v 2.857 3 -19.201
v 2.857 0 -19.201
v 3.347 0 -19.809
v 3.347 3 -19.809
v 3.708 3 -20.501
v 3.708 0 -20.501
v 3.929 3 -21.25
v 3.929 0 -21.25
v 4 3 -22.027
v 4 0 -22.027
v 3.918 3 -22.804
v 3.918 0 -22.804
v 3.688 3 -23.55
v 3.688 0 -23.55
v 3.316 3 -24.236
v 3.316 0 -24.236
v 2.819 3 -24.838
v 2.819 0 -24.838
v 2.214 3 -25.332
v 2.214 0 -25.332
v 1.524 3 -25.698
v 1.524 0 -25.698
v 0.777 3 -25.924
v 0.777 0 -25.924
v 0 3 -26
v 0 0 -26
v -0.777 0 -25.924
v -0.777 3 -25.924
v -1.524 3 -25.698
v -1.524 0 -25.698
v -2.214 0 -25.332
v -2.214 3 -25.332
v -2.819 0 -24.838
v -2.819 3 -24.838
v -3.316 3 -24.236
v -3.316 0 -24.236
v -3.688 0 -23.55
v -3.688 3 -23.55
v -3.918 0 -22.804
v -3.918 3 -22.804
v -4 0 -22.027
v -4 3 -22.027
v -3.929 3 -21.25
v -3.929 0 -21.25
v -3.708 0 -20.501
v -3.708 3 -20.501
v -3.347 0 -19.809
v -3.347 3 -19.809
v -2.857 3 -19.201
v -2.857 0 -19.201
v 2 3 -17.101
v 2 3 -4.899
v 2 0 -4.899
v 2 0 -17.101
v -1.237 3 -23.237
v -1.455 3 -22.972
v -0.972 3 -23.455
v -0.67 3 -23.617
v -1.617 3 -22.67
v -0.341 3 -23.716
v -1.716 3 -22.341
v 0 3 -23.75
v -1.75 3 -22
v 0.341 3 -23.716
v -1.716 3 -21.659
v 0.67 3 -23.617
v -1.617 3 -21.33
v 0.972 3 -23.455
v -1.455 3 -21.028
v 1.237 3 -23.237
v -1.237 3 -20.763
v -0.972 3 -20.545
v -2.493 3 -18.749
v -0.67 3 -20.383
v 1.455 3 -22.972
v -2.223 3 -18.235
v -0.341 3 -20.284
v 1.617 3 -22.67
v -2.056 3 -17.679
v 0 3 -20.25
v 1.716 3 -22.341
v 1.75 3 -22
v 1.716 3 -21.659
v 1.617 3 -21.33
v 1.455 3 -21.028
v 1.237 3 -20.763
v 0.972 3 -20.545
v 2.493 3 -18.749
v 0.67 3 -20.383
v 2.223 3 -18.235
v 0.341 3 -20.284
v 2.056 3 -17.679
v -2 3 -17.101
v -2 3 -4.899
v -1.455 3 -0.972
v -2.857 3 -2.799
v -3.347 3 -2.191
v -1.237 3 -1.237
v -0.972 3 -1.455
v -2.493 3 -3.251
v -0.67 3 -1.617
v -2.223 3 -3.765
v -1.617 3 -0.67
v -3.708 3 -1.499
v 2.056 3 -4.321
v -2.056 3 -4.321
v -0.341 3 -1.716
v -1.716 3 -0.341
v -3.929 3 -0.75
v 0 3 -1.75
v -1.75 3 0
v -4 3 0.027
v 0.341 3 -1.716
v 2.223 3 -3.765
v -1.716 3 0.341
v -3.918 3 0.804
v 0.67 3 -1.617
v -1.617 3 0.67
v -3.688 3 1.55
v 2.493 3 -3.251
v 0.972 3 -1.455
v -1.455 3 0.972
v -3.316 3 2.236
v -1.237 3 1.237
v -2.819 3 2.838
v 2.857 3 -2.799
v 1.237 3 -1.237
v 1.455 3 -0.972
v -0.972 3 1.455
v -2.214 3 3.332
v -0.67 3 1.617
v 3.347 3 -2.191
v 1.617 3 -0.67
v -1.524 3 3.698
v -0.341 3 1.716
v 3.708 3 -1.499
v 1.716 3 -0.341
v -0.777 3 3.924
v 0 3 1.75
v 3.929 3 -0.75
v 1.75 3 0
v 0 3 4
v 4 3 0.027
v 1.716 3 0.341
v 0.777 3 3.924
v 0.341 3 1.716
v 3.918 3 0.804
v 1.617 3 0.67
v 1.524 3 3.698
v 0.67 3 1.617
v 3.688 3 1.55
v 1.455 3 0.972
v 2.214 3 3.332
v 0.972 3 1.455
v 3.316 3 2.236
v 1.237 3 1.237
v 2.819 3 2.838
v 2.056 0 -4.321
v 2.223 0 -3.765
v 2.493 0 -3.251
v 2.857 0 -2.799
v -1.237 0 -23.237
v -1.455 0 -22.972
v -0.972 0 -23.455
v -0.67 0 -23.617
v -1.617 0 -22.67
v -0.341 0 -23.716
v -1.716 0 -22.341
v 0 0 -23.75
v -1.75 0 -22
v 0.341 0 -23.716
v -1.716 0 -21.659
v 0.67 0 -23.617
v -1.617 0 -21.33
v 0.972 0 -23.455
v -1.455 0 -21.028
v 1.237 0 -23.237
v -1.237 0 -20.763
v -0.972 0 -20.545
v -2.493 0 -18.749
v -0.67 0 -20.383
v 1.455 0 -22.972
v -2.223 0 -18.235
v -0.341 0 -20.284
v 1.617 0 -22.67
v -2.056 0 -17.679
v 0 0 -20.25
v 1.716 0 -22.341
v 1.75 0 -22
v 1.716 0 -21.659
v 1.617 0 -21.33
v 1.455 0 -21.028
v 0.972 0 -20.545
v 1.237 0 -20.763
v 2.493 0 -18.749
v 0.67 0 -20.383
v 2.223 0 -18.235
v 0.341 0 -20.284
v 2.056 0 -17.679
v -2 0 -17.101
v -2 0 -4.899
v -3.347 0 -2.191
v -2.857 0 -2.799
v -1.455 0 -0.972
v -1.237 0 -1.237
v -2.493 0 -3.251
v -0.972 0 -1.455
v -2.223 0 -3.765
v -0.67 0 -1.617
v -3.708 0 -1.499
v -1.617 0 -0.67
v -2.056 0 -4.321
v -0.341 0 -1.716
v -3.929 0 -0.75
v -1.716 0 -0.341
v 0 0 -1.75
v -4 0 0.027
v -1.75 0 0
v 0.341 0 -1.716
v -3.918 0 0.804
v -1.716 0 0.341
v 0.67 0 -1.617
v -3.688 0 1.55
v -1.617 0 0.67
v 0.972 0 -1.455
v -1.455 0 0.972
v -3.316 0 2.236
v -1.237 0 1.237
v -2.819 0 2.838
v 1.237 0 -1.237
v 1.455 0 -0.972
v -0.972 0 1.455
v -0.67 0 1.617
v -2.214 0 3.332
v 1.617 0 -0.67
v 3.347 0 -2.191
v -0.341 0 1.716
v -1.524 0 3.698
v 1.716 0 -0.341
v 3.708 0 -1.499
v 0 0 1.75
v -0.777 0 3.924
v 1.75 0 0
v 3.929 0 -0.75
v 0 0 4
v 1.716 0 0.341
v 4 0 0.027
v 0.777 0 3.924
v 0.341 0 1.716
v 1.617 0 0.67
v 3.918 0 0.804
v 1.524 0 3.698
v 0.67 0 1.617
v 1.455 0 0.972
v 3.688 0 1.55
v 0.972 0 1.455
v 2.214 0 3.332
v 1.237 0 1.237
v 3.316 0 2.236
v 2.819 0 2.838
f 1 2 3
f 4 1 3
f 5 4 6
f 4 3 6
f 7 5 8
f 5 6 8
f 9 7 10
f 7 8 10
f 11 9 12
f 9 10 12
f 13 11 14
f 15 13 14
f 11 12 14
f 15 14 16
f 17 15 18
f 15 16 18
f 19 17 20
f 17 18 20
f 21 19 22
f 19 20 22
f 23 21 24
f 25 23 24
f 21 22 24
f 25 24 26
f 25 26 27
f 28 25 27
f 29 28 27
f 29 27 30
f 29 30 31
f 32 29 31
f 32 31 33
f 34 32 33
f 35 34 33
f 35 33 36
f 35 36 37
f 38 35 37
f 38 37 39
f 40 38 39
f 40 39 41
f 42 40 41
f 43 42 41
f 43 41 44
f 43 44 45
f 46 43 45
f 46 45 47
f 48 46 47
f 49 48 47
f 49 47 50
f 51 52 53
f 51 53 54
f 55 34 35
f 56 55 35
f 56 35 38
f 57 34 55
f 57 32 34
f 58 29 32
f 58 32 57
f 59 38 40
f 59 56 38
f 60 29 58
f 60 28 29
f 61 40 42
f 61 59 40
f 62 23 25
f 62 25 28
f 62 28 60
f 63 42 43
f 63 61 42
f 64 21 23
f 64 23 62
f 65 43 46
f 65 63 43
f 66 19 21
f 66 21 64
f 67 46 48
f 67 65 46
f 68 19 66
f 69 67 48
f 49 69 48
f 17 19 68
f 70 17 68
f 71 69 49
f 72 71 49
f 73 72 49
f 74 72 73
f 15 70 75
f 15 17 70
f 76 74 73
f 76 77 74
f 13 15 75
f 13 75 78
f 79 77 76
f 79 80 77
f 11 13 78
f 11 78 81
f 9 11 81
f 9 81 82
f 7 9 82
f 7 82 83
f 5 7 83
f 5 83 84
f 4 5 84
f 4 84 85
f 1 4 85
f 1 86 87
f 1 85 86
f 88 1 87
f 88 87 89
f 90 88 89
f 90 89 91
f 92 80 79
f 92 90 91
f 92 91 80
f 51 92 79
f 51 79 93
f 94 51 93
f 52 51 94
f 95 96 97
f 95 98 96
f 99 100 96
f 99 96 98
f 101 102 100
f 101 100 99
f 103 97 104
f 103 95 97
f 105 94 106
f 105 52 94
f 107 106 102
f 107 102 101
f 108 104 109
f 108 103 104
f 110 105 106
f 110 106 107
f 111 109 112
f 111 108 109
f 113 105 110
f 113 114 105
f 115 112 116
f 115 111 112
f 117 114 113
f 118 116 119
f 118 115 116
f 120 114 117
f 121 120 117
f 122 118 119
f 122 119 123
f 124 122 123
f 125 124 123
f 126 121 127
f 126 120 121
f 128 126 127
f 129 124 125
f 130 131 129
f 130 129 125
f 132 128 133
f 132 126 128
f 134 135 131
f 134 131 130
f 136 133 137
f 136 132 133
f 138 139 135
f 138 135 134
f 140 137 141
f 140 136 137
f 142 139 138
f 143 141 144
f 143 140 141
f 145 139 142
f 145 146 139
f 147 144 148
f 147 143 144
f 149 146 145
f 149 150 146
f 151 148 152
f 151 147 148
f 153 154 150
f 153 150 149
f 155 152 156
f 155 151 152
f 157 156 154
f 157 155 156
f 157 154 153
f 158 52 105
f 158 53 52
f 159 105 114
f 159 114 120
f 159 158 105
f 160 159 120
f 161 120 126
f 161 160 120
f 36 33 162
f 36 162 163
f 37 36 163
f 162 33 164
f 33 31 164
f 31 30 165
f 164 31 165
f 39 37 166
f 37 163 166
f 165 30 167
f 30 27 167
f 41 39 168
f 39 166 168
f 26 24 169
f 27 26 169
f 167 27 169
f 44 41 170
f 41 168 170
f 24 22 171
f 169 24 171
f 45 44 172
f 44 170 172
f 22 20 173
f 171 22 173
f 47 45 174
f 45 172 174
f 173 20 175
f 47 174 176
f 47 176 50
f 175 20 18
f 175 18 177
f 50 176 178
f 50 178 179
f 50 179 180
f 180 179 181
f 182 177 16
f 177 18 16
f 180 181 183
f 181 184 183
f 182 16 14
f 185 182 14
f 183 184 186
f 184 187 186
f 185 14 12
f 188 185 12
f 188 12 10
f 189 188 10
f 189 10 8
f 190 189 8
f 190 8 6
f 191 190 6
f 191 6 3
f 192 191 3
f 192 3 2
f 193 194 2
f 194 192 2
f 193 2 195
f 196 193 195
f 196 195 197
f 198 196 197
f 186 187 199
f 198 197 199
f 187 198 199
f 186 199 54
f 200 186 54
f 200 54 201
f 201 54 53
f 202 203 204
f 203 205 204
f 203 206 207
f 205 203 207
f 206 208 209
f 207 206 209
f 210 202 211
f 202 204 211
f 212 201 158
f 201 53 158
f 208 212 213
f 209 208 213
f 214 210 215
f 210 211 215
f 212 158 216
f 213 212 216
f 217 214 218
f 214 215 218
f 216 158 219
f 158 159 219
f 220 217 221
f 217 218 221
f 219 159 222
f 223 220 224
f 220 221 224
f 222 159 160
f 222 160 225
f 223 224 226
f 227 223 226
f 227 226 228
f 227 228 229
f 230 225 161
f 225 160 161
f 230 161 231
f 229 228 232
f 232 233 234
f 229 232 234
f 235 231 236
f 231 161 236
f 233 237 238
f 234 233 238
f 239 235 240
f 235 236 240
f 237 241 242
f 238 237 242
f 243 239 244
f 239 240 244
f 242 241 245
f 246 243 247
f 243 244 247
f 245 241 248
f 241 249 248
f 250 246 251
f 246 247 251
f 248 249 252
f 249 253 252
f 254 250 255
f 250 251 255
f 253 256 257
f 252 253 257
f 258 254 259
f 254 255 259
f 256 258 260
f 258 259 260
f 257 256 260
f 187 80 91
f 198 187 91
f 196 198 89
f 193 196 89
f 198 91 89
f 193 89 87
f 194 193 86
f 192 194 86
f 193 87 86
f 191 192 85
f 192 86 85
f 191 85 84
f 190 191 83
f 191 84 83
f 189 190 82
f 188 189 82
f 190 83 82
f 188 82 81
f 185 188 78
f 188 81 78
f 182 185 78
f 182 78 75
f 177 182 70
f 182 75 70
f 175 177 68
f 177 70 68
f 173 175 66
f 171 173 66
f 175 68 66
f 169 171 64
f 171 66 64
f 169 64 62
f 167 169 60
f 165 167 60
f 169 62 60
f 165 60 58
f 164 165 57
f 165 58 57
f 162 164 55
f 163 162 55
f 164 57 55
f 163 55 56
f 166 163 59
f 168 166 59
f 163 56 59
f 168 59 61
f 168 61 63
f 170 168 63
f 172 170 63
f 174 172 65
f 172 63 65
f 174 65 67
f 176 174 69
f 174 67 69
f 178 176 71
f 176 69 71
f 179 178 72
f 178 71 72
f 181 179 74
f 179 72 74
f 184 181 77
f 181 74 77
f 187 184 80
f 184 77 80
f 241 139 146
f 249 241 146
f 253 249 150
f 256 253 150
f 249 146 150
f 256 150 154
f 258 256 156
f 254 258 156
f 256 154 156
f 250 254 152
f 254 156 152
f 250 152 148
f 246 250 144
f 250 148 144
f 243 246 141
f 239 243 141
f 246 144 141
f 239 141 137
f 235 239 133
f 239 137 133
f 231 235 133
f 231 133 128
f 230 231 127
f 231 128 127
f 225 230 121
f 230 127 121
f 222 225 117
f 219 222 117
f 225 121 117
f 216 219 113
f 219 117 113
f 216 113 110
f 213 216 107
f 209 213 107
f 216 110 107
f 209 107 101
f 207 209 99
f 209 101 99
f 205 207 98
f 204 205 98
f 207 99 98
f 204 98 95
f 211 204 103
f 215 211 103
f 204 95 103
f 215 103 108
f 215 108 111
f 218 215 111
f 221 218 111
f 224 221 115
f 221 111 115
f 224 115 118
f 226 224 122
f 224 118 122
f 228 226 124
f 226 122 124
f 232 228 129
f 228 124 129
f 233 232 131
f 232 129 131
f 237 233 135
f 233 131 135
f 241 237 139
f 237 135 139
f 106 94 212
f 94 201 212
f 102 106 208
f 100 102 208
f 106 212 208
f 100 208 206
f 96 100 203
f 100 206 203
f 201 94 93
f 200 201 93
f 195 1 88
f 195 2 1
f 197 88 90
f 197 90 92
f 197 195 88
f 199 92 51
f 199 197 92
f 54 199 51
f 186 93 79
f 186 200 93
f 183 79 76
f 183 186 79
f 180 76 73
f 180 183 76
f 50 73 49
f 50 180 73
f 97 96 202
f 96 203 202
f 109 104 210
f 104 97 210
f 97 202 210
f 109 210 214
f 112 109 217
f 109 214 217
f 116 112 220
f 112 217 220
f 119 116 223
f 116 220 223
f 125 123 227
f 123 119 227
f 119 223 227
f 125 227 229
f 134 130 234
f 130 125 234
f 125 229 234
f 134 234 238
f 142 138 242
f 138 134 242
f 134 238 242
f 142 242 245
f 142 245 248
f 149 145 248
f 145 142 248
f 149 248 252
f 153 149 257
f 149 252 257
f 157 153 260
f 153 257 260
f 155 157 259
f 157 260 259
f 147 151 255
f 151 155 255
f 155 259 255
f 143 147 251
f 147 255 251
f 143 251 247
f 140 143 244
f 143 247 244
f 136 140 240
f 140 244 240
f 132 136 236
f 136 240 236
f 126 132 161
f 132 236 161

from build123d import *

# Parameters (mm, degrees)
SKETCH_1_R          = 4
EXTRUDE_1_DEPTH     = 3
EXTRUDE_1_2_DEPTH   = 3
SKETCH_2_W          = 4
SKETCH_2_H          = 22
EXTRUDE_2_DEPTH     = 3
FILLET_1_R          = 3
SKETCH_3_R          = 1.75
CUT_EXTRUDE_1_DEPTH = 3


with BuildPart() as part:
    # 스케치1 → 보스-돌출1 (new body)
    with BuildSketch(Plane(origin=(0, 0, 0), x_dir=(1, 0, 0), z_dir=(0, 1, 0))):
        with Locations(Location((0, 0, 0), (0, 0, 270))):
            Circle(SKETCH_1_R)
    extrude(amount=EXTRUDE_1_DEPTH)



with BuildPart() as body_2:
    # 스케치1 → Extrude 1 2 (new body)
    with BuildSketch(Plane(origin=(0, 0, 0), x_dir=(1, 0, 0), z_dir=(0, 1, 0))):
        with Locations(Location((0, 22, 0), (0, 0, 270))):
            Circle(SKETCH_1_R)
    extrude(amount=EXTRUDE_1_2_DEPTH)


with BuildPart() as part_1:
    add(part.part)

    add(body_2.part)  # 보스-돌출2 merges body 2
    # 스케치2 → 보스-돌출2 (add)
    with BuildSketch(Plane(origin=(0, 3, 0), x_dir=(1, 0, 0), z_dir=(0, 1, 0))):
        with Locations((0, 11)):
            Rectangle(SKETCH_2_W, SKETCH_2_H)
    extrude(amount=-EXTRUDE_2_DEPTH)

    # 필렛1
    fillet_1_edges = [part_1.edges().sort_by_distance(p)[0] for p in [
        (2, 1.5, -3.464101615),
        (-2, 1.5, -3.464101615),
        (-2, 1.5, -18.535898385),
        (2, 1.5, -18.535898385),
    ]]
    fillet(fillet_1_edges, radius=FILLET_1_R)

    # 스케치3 → 컷-돌출1 (cut)
    with BuildSketch(Plane(origin=(0, 3, 0), x_dir=(1, 0, 0), z_dir=(0, 1, 0))):
        with Locations(Location((0, 22, 0), (0, 0, 270))):
            Circle(SKETCH_3_R)
        with Locations(Location((0, 0, 0), (0, 0, 270))):
            Circle(SKETCH_3_R)
    extrude(amount=-CUT_EXTRUDE_1_DEPTH, mode=Mode.SUBTRACT)


solid = part_1.part
